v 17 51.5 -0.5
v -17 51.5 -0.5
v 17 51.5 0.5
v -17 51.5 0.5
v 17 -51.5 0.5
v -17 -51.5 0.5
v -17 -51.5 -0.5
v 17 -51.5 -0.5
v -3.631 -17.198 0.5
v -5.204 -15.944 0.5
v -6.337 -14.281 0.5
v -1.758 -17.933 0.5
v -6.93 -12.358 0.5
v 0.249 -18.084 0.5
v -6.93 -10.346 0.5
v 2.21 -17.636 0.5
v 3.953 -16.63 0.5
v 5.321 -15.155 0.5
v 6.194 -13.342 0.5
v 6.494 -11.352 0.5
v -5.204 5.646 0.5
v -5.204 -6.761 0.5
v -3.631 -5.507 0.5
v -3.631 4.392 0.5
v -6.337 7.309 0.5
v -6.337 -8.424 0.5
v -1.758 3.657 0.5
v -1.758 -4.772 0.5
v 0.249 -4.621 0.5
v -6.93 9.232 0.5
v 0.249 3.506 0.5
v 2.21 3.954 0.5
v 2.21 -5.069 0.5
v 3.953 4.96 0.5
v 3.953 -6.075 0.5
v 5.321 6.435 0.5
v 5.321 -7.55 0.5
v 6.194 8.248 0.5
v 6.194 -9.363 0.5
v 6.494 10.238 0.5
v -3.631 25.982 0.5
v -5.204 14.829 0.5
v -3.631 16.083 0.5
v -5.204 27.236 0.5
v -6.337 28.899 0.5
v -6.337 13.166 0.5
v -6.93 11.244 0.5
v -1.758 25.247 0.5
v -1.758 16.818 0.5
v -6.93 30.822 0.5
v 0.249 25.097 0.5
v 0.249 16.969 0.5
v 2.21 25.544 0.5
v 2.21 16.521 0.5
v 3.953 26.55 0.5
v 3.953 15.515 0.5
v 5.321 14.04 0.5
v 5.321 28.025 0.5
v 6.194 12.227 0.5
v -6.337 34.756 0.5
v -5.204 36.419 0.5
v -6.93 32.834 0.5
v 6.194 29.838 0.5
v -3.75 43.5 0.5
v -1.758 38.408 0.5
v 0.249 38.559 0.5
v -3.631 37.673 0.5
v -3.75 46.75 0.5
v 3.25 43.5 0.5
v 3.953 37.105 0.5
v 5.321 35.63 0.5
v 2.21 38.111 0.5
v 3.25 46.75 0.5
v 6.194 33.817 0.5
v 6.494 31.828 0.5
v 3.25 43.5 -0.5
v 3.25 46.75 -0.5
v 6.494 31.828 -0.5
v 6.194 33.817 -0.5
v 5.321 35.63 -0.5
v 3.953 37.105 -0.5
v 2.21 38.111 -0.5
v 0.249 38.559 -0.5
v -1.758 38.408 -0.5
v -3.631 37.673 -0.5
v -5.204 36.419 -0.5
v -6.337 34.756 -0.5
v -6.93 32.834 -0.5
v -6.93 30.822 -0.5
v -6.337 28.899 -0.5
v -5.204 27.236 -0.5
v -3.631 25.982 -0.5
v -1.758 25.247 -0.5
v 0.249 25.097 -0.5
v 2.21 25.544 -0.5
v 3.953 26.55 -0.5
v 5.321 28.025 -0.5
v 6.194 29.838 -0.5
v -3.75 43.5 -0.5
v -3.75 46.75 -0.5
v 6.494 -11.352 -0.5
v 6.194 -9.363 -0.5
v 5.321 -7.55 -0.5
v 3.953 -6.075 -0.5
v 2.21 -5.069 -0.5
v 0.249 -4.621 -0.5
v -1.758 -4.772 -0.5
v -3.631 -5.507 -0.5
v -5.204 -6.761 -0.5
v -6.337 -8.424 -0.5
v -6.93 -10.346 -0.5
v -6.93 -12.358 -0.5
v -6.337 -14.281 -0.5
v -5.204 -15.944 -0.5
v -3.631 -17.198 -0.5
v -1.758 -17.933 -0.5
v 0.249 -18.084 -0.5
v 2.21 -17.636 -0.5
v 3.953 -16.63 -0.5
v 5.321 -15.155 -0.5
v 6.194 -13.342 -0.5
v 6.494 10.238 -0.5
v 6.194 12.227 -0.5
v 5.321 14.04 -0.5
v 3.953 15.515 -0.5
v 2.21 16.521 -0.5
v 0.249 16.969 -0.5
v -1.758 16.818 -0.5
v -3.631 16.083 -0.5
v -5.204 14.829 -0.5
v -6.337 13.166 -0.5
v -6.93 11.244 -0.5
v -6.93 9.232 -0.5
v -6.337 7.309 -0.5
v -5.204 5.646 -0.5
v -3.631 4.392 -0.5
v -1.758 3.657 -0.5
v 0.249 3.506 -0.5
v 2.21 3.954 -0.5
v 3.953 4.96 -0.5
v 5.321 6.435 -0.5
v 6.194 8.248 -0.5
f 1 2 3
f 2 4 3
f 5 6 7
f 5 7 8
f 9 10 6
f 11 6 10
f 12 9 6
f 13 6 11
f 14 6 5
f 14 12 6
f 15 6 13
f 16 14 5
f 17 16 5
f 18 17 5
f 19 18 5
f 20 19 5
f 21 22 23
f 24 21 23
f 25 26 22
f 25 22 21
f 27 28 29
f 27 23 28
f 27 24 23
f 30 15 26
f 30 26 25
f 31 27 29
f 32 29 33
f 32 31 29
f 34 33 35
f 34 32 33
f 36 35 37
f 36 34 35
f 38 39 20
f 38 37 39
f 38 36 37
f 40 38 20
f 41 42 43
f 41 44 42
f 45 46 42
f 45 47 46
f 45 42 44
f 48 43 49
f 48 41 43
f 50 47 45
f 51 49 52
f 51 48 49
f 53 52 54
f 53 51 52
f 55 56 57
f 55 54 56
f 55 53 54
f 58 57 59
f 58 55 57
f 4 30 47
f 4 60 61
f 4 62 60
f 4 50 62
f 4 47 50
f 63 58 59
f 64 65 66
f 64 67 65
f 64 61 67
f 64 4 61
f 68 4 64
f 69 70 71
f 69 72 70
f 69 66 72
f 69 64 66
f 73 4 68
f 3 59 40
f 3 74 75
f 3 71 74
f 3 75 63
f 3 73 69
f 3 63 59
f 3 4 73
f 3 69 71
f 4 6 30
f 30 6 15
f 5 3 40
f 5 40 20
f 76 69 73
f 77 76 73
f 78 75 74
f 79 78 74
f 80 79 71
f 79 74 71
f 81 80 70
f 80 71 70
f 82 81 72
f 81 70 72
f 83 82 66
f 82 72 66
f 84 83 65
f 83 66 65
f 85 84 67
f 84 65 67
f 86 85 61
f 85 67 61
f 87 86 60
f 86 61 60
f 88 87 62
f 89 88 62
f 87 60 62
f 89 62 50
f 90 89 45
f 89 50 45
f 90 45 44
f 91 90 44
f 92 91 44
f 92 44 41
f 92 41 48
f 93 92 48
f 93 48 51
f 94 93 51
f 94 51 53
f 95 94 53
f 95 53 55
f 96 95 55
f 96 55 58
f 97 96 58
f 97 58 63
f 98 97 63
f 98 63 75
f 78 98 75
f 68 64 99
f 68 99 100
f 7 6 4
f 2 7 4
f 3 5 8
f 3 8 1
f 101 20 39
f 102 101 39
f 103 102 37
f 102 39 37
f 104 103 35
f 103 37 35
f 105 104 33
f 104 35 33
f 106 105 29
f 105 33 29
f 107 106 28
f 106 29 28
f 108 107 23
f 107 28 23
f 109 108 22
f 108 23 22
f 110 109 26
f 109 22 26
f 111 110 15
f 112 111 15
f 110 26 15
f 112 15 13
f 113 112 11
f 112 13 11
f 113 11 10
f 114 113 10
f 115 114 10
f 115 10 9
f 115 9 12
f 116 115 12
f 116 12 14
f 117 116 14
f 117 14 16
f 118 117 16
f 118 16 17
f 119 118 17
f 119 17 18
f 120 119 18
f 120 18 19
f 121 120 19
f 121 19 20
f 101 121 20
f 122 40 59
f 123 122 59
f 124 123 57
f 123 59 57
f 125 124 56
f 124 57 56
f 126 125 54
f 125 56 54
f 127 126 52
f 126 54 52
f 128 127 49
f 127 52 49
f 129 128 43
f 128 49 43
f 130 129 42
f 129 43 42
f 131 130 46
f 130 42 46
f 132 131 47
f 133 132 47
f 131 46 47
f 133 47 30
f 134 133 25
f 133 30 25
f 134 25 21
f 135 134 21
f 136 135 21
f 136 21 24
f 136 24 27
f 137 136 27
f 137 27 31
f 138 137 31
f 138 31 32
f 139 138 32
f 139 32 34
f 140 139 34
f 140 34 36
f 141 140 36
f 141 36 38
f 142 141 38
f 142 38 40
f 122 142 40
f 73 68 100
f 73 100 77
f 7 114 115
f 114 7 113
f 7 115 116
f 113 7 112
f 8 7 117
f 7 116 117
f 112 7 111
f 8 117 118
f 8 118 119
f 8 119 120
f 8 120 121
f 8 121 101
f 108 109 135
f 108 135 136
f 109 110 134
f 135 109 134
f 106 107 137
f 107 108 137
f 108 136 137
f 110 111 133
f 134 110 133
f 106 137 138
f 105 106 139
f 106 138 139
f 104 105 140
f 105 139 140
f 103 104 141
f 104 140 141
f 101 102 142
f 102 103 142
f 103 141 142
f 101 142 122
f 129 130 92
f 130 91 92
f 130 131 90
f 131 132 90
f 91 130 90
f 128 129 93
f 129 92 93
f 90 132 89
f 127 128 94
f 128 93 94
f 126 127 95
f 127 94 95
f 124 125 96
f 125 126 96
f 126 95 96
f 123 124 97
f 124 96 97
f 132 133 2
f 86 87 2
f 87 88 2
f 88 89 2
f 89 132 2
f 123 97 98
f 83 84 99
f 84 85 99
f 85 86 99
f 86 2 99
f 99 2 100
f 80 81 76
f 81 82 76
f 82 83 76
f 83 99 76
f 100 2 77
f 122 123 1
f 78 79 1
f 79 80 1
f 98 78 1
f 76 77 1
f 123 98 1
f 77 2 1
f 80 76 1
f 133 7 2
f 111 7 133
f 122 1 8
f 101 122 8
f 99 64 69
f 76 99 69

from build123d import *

# Parameters (mm, degrees)
SKETCH1_W           = 34
SKETCH1_H           = 103
BOSS_EXTRUDE1_DEPTH = 0.5
SKETCH3_R           = 6.75
SKETCH3_W           = 7
SKETCH3_H           = 3.25
CUT_EXTRUDE1_DEPTH  = 55.242511004


with BuildPart() as part:
    # Sketch1 → Boss-Extrude1 (new, symmetric)
    with BuildSketch(Plane.XY):
        Rectangle(SKETCH1_W, SKETCH1_H)
    extrude(amount=BOSS_EXTRUDE1_DEPTH, both=True)

    # Sketch3 → Cut-Extrude1 (cut, through all)
    with BuildSketch(Plane.XY.offset(0.5)):
        with Locations((-0.255791225, 31.827660642)):
            Circle(SKETCH3_R)
        with Locations((-0.255791225, 10.237617462)):
            Circle(SKETCH3_R)
        with Locations((-0.255791225, -11.352425718)):
            Circle(SKETCH3_R)
        with Locations((-0.25, 45.125)):
            Rectangle(SKETCH3_W, SKETCH3_H)
    extrude(amount=-CUT_EXTRUDE1_DEPTH, mode=Mode.SUBTRACT)


solid = part.part
